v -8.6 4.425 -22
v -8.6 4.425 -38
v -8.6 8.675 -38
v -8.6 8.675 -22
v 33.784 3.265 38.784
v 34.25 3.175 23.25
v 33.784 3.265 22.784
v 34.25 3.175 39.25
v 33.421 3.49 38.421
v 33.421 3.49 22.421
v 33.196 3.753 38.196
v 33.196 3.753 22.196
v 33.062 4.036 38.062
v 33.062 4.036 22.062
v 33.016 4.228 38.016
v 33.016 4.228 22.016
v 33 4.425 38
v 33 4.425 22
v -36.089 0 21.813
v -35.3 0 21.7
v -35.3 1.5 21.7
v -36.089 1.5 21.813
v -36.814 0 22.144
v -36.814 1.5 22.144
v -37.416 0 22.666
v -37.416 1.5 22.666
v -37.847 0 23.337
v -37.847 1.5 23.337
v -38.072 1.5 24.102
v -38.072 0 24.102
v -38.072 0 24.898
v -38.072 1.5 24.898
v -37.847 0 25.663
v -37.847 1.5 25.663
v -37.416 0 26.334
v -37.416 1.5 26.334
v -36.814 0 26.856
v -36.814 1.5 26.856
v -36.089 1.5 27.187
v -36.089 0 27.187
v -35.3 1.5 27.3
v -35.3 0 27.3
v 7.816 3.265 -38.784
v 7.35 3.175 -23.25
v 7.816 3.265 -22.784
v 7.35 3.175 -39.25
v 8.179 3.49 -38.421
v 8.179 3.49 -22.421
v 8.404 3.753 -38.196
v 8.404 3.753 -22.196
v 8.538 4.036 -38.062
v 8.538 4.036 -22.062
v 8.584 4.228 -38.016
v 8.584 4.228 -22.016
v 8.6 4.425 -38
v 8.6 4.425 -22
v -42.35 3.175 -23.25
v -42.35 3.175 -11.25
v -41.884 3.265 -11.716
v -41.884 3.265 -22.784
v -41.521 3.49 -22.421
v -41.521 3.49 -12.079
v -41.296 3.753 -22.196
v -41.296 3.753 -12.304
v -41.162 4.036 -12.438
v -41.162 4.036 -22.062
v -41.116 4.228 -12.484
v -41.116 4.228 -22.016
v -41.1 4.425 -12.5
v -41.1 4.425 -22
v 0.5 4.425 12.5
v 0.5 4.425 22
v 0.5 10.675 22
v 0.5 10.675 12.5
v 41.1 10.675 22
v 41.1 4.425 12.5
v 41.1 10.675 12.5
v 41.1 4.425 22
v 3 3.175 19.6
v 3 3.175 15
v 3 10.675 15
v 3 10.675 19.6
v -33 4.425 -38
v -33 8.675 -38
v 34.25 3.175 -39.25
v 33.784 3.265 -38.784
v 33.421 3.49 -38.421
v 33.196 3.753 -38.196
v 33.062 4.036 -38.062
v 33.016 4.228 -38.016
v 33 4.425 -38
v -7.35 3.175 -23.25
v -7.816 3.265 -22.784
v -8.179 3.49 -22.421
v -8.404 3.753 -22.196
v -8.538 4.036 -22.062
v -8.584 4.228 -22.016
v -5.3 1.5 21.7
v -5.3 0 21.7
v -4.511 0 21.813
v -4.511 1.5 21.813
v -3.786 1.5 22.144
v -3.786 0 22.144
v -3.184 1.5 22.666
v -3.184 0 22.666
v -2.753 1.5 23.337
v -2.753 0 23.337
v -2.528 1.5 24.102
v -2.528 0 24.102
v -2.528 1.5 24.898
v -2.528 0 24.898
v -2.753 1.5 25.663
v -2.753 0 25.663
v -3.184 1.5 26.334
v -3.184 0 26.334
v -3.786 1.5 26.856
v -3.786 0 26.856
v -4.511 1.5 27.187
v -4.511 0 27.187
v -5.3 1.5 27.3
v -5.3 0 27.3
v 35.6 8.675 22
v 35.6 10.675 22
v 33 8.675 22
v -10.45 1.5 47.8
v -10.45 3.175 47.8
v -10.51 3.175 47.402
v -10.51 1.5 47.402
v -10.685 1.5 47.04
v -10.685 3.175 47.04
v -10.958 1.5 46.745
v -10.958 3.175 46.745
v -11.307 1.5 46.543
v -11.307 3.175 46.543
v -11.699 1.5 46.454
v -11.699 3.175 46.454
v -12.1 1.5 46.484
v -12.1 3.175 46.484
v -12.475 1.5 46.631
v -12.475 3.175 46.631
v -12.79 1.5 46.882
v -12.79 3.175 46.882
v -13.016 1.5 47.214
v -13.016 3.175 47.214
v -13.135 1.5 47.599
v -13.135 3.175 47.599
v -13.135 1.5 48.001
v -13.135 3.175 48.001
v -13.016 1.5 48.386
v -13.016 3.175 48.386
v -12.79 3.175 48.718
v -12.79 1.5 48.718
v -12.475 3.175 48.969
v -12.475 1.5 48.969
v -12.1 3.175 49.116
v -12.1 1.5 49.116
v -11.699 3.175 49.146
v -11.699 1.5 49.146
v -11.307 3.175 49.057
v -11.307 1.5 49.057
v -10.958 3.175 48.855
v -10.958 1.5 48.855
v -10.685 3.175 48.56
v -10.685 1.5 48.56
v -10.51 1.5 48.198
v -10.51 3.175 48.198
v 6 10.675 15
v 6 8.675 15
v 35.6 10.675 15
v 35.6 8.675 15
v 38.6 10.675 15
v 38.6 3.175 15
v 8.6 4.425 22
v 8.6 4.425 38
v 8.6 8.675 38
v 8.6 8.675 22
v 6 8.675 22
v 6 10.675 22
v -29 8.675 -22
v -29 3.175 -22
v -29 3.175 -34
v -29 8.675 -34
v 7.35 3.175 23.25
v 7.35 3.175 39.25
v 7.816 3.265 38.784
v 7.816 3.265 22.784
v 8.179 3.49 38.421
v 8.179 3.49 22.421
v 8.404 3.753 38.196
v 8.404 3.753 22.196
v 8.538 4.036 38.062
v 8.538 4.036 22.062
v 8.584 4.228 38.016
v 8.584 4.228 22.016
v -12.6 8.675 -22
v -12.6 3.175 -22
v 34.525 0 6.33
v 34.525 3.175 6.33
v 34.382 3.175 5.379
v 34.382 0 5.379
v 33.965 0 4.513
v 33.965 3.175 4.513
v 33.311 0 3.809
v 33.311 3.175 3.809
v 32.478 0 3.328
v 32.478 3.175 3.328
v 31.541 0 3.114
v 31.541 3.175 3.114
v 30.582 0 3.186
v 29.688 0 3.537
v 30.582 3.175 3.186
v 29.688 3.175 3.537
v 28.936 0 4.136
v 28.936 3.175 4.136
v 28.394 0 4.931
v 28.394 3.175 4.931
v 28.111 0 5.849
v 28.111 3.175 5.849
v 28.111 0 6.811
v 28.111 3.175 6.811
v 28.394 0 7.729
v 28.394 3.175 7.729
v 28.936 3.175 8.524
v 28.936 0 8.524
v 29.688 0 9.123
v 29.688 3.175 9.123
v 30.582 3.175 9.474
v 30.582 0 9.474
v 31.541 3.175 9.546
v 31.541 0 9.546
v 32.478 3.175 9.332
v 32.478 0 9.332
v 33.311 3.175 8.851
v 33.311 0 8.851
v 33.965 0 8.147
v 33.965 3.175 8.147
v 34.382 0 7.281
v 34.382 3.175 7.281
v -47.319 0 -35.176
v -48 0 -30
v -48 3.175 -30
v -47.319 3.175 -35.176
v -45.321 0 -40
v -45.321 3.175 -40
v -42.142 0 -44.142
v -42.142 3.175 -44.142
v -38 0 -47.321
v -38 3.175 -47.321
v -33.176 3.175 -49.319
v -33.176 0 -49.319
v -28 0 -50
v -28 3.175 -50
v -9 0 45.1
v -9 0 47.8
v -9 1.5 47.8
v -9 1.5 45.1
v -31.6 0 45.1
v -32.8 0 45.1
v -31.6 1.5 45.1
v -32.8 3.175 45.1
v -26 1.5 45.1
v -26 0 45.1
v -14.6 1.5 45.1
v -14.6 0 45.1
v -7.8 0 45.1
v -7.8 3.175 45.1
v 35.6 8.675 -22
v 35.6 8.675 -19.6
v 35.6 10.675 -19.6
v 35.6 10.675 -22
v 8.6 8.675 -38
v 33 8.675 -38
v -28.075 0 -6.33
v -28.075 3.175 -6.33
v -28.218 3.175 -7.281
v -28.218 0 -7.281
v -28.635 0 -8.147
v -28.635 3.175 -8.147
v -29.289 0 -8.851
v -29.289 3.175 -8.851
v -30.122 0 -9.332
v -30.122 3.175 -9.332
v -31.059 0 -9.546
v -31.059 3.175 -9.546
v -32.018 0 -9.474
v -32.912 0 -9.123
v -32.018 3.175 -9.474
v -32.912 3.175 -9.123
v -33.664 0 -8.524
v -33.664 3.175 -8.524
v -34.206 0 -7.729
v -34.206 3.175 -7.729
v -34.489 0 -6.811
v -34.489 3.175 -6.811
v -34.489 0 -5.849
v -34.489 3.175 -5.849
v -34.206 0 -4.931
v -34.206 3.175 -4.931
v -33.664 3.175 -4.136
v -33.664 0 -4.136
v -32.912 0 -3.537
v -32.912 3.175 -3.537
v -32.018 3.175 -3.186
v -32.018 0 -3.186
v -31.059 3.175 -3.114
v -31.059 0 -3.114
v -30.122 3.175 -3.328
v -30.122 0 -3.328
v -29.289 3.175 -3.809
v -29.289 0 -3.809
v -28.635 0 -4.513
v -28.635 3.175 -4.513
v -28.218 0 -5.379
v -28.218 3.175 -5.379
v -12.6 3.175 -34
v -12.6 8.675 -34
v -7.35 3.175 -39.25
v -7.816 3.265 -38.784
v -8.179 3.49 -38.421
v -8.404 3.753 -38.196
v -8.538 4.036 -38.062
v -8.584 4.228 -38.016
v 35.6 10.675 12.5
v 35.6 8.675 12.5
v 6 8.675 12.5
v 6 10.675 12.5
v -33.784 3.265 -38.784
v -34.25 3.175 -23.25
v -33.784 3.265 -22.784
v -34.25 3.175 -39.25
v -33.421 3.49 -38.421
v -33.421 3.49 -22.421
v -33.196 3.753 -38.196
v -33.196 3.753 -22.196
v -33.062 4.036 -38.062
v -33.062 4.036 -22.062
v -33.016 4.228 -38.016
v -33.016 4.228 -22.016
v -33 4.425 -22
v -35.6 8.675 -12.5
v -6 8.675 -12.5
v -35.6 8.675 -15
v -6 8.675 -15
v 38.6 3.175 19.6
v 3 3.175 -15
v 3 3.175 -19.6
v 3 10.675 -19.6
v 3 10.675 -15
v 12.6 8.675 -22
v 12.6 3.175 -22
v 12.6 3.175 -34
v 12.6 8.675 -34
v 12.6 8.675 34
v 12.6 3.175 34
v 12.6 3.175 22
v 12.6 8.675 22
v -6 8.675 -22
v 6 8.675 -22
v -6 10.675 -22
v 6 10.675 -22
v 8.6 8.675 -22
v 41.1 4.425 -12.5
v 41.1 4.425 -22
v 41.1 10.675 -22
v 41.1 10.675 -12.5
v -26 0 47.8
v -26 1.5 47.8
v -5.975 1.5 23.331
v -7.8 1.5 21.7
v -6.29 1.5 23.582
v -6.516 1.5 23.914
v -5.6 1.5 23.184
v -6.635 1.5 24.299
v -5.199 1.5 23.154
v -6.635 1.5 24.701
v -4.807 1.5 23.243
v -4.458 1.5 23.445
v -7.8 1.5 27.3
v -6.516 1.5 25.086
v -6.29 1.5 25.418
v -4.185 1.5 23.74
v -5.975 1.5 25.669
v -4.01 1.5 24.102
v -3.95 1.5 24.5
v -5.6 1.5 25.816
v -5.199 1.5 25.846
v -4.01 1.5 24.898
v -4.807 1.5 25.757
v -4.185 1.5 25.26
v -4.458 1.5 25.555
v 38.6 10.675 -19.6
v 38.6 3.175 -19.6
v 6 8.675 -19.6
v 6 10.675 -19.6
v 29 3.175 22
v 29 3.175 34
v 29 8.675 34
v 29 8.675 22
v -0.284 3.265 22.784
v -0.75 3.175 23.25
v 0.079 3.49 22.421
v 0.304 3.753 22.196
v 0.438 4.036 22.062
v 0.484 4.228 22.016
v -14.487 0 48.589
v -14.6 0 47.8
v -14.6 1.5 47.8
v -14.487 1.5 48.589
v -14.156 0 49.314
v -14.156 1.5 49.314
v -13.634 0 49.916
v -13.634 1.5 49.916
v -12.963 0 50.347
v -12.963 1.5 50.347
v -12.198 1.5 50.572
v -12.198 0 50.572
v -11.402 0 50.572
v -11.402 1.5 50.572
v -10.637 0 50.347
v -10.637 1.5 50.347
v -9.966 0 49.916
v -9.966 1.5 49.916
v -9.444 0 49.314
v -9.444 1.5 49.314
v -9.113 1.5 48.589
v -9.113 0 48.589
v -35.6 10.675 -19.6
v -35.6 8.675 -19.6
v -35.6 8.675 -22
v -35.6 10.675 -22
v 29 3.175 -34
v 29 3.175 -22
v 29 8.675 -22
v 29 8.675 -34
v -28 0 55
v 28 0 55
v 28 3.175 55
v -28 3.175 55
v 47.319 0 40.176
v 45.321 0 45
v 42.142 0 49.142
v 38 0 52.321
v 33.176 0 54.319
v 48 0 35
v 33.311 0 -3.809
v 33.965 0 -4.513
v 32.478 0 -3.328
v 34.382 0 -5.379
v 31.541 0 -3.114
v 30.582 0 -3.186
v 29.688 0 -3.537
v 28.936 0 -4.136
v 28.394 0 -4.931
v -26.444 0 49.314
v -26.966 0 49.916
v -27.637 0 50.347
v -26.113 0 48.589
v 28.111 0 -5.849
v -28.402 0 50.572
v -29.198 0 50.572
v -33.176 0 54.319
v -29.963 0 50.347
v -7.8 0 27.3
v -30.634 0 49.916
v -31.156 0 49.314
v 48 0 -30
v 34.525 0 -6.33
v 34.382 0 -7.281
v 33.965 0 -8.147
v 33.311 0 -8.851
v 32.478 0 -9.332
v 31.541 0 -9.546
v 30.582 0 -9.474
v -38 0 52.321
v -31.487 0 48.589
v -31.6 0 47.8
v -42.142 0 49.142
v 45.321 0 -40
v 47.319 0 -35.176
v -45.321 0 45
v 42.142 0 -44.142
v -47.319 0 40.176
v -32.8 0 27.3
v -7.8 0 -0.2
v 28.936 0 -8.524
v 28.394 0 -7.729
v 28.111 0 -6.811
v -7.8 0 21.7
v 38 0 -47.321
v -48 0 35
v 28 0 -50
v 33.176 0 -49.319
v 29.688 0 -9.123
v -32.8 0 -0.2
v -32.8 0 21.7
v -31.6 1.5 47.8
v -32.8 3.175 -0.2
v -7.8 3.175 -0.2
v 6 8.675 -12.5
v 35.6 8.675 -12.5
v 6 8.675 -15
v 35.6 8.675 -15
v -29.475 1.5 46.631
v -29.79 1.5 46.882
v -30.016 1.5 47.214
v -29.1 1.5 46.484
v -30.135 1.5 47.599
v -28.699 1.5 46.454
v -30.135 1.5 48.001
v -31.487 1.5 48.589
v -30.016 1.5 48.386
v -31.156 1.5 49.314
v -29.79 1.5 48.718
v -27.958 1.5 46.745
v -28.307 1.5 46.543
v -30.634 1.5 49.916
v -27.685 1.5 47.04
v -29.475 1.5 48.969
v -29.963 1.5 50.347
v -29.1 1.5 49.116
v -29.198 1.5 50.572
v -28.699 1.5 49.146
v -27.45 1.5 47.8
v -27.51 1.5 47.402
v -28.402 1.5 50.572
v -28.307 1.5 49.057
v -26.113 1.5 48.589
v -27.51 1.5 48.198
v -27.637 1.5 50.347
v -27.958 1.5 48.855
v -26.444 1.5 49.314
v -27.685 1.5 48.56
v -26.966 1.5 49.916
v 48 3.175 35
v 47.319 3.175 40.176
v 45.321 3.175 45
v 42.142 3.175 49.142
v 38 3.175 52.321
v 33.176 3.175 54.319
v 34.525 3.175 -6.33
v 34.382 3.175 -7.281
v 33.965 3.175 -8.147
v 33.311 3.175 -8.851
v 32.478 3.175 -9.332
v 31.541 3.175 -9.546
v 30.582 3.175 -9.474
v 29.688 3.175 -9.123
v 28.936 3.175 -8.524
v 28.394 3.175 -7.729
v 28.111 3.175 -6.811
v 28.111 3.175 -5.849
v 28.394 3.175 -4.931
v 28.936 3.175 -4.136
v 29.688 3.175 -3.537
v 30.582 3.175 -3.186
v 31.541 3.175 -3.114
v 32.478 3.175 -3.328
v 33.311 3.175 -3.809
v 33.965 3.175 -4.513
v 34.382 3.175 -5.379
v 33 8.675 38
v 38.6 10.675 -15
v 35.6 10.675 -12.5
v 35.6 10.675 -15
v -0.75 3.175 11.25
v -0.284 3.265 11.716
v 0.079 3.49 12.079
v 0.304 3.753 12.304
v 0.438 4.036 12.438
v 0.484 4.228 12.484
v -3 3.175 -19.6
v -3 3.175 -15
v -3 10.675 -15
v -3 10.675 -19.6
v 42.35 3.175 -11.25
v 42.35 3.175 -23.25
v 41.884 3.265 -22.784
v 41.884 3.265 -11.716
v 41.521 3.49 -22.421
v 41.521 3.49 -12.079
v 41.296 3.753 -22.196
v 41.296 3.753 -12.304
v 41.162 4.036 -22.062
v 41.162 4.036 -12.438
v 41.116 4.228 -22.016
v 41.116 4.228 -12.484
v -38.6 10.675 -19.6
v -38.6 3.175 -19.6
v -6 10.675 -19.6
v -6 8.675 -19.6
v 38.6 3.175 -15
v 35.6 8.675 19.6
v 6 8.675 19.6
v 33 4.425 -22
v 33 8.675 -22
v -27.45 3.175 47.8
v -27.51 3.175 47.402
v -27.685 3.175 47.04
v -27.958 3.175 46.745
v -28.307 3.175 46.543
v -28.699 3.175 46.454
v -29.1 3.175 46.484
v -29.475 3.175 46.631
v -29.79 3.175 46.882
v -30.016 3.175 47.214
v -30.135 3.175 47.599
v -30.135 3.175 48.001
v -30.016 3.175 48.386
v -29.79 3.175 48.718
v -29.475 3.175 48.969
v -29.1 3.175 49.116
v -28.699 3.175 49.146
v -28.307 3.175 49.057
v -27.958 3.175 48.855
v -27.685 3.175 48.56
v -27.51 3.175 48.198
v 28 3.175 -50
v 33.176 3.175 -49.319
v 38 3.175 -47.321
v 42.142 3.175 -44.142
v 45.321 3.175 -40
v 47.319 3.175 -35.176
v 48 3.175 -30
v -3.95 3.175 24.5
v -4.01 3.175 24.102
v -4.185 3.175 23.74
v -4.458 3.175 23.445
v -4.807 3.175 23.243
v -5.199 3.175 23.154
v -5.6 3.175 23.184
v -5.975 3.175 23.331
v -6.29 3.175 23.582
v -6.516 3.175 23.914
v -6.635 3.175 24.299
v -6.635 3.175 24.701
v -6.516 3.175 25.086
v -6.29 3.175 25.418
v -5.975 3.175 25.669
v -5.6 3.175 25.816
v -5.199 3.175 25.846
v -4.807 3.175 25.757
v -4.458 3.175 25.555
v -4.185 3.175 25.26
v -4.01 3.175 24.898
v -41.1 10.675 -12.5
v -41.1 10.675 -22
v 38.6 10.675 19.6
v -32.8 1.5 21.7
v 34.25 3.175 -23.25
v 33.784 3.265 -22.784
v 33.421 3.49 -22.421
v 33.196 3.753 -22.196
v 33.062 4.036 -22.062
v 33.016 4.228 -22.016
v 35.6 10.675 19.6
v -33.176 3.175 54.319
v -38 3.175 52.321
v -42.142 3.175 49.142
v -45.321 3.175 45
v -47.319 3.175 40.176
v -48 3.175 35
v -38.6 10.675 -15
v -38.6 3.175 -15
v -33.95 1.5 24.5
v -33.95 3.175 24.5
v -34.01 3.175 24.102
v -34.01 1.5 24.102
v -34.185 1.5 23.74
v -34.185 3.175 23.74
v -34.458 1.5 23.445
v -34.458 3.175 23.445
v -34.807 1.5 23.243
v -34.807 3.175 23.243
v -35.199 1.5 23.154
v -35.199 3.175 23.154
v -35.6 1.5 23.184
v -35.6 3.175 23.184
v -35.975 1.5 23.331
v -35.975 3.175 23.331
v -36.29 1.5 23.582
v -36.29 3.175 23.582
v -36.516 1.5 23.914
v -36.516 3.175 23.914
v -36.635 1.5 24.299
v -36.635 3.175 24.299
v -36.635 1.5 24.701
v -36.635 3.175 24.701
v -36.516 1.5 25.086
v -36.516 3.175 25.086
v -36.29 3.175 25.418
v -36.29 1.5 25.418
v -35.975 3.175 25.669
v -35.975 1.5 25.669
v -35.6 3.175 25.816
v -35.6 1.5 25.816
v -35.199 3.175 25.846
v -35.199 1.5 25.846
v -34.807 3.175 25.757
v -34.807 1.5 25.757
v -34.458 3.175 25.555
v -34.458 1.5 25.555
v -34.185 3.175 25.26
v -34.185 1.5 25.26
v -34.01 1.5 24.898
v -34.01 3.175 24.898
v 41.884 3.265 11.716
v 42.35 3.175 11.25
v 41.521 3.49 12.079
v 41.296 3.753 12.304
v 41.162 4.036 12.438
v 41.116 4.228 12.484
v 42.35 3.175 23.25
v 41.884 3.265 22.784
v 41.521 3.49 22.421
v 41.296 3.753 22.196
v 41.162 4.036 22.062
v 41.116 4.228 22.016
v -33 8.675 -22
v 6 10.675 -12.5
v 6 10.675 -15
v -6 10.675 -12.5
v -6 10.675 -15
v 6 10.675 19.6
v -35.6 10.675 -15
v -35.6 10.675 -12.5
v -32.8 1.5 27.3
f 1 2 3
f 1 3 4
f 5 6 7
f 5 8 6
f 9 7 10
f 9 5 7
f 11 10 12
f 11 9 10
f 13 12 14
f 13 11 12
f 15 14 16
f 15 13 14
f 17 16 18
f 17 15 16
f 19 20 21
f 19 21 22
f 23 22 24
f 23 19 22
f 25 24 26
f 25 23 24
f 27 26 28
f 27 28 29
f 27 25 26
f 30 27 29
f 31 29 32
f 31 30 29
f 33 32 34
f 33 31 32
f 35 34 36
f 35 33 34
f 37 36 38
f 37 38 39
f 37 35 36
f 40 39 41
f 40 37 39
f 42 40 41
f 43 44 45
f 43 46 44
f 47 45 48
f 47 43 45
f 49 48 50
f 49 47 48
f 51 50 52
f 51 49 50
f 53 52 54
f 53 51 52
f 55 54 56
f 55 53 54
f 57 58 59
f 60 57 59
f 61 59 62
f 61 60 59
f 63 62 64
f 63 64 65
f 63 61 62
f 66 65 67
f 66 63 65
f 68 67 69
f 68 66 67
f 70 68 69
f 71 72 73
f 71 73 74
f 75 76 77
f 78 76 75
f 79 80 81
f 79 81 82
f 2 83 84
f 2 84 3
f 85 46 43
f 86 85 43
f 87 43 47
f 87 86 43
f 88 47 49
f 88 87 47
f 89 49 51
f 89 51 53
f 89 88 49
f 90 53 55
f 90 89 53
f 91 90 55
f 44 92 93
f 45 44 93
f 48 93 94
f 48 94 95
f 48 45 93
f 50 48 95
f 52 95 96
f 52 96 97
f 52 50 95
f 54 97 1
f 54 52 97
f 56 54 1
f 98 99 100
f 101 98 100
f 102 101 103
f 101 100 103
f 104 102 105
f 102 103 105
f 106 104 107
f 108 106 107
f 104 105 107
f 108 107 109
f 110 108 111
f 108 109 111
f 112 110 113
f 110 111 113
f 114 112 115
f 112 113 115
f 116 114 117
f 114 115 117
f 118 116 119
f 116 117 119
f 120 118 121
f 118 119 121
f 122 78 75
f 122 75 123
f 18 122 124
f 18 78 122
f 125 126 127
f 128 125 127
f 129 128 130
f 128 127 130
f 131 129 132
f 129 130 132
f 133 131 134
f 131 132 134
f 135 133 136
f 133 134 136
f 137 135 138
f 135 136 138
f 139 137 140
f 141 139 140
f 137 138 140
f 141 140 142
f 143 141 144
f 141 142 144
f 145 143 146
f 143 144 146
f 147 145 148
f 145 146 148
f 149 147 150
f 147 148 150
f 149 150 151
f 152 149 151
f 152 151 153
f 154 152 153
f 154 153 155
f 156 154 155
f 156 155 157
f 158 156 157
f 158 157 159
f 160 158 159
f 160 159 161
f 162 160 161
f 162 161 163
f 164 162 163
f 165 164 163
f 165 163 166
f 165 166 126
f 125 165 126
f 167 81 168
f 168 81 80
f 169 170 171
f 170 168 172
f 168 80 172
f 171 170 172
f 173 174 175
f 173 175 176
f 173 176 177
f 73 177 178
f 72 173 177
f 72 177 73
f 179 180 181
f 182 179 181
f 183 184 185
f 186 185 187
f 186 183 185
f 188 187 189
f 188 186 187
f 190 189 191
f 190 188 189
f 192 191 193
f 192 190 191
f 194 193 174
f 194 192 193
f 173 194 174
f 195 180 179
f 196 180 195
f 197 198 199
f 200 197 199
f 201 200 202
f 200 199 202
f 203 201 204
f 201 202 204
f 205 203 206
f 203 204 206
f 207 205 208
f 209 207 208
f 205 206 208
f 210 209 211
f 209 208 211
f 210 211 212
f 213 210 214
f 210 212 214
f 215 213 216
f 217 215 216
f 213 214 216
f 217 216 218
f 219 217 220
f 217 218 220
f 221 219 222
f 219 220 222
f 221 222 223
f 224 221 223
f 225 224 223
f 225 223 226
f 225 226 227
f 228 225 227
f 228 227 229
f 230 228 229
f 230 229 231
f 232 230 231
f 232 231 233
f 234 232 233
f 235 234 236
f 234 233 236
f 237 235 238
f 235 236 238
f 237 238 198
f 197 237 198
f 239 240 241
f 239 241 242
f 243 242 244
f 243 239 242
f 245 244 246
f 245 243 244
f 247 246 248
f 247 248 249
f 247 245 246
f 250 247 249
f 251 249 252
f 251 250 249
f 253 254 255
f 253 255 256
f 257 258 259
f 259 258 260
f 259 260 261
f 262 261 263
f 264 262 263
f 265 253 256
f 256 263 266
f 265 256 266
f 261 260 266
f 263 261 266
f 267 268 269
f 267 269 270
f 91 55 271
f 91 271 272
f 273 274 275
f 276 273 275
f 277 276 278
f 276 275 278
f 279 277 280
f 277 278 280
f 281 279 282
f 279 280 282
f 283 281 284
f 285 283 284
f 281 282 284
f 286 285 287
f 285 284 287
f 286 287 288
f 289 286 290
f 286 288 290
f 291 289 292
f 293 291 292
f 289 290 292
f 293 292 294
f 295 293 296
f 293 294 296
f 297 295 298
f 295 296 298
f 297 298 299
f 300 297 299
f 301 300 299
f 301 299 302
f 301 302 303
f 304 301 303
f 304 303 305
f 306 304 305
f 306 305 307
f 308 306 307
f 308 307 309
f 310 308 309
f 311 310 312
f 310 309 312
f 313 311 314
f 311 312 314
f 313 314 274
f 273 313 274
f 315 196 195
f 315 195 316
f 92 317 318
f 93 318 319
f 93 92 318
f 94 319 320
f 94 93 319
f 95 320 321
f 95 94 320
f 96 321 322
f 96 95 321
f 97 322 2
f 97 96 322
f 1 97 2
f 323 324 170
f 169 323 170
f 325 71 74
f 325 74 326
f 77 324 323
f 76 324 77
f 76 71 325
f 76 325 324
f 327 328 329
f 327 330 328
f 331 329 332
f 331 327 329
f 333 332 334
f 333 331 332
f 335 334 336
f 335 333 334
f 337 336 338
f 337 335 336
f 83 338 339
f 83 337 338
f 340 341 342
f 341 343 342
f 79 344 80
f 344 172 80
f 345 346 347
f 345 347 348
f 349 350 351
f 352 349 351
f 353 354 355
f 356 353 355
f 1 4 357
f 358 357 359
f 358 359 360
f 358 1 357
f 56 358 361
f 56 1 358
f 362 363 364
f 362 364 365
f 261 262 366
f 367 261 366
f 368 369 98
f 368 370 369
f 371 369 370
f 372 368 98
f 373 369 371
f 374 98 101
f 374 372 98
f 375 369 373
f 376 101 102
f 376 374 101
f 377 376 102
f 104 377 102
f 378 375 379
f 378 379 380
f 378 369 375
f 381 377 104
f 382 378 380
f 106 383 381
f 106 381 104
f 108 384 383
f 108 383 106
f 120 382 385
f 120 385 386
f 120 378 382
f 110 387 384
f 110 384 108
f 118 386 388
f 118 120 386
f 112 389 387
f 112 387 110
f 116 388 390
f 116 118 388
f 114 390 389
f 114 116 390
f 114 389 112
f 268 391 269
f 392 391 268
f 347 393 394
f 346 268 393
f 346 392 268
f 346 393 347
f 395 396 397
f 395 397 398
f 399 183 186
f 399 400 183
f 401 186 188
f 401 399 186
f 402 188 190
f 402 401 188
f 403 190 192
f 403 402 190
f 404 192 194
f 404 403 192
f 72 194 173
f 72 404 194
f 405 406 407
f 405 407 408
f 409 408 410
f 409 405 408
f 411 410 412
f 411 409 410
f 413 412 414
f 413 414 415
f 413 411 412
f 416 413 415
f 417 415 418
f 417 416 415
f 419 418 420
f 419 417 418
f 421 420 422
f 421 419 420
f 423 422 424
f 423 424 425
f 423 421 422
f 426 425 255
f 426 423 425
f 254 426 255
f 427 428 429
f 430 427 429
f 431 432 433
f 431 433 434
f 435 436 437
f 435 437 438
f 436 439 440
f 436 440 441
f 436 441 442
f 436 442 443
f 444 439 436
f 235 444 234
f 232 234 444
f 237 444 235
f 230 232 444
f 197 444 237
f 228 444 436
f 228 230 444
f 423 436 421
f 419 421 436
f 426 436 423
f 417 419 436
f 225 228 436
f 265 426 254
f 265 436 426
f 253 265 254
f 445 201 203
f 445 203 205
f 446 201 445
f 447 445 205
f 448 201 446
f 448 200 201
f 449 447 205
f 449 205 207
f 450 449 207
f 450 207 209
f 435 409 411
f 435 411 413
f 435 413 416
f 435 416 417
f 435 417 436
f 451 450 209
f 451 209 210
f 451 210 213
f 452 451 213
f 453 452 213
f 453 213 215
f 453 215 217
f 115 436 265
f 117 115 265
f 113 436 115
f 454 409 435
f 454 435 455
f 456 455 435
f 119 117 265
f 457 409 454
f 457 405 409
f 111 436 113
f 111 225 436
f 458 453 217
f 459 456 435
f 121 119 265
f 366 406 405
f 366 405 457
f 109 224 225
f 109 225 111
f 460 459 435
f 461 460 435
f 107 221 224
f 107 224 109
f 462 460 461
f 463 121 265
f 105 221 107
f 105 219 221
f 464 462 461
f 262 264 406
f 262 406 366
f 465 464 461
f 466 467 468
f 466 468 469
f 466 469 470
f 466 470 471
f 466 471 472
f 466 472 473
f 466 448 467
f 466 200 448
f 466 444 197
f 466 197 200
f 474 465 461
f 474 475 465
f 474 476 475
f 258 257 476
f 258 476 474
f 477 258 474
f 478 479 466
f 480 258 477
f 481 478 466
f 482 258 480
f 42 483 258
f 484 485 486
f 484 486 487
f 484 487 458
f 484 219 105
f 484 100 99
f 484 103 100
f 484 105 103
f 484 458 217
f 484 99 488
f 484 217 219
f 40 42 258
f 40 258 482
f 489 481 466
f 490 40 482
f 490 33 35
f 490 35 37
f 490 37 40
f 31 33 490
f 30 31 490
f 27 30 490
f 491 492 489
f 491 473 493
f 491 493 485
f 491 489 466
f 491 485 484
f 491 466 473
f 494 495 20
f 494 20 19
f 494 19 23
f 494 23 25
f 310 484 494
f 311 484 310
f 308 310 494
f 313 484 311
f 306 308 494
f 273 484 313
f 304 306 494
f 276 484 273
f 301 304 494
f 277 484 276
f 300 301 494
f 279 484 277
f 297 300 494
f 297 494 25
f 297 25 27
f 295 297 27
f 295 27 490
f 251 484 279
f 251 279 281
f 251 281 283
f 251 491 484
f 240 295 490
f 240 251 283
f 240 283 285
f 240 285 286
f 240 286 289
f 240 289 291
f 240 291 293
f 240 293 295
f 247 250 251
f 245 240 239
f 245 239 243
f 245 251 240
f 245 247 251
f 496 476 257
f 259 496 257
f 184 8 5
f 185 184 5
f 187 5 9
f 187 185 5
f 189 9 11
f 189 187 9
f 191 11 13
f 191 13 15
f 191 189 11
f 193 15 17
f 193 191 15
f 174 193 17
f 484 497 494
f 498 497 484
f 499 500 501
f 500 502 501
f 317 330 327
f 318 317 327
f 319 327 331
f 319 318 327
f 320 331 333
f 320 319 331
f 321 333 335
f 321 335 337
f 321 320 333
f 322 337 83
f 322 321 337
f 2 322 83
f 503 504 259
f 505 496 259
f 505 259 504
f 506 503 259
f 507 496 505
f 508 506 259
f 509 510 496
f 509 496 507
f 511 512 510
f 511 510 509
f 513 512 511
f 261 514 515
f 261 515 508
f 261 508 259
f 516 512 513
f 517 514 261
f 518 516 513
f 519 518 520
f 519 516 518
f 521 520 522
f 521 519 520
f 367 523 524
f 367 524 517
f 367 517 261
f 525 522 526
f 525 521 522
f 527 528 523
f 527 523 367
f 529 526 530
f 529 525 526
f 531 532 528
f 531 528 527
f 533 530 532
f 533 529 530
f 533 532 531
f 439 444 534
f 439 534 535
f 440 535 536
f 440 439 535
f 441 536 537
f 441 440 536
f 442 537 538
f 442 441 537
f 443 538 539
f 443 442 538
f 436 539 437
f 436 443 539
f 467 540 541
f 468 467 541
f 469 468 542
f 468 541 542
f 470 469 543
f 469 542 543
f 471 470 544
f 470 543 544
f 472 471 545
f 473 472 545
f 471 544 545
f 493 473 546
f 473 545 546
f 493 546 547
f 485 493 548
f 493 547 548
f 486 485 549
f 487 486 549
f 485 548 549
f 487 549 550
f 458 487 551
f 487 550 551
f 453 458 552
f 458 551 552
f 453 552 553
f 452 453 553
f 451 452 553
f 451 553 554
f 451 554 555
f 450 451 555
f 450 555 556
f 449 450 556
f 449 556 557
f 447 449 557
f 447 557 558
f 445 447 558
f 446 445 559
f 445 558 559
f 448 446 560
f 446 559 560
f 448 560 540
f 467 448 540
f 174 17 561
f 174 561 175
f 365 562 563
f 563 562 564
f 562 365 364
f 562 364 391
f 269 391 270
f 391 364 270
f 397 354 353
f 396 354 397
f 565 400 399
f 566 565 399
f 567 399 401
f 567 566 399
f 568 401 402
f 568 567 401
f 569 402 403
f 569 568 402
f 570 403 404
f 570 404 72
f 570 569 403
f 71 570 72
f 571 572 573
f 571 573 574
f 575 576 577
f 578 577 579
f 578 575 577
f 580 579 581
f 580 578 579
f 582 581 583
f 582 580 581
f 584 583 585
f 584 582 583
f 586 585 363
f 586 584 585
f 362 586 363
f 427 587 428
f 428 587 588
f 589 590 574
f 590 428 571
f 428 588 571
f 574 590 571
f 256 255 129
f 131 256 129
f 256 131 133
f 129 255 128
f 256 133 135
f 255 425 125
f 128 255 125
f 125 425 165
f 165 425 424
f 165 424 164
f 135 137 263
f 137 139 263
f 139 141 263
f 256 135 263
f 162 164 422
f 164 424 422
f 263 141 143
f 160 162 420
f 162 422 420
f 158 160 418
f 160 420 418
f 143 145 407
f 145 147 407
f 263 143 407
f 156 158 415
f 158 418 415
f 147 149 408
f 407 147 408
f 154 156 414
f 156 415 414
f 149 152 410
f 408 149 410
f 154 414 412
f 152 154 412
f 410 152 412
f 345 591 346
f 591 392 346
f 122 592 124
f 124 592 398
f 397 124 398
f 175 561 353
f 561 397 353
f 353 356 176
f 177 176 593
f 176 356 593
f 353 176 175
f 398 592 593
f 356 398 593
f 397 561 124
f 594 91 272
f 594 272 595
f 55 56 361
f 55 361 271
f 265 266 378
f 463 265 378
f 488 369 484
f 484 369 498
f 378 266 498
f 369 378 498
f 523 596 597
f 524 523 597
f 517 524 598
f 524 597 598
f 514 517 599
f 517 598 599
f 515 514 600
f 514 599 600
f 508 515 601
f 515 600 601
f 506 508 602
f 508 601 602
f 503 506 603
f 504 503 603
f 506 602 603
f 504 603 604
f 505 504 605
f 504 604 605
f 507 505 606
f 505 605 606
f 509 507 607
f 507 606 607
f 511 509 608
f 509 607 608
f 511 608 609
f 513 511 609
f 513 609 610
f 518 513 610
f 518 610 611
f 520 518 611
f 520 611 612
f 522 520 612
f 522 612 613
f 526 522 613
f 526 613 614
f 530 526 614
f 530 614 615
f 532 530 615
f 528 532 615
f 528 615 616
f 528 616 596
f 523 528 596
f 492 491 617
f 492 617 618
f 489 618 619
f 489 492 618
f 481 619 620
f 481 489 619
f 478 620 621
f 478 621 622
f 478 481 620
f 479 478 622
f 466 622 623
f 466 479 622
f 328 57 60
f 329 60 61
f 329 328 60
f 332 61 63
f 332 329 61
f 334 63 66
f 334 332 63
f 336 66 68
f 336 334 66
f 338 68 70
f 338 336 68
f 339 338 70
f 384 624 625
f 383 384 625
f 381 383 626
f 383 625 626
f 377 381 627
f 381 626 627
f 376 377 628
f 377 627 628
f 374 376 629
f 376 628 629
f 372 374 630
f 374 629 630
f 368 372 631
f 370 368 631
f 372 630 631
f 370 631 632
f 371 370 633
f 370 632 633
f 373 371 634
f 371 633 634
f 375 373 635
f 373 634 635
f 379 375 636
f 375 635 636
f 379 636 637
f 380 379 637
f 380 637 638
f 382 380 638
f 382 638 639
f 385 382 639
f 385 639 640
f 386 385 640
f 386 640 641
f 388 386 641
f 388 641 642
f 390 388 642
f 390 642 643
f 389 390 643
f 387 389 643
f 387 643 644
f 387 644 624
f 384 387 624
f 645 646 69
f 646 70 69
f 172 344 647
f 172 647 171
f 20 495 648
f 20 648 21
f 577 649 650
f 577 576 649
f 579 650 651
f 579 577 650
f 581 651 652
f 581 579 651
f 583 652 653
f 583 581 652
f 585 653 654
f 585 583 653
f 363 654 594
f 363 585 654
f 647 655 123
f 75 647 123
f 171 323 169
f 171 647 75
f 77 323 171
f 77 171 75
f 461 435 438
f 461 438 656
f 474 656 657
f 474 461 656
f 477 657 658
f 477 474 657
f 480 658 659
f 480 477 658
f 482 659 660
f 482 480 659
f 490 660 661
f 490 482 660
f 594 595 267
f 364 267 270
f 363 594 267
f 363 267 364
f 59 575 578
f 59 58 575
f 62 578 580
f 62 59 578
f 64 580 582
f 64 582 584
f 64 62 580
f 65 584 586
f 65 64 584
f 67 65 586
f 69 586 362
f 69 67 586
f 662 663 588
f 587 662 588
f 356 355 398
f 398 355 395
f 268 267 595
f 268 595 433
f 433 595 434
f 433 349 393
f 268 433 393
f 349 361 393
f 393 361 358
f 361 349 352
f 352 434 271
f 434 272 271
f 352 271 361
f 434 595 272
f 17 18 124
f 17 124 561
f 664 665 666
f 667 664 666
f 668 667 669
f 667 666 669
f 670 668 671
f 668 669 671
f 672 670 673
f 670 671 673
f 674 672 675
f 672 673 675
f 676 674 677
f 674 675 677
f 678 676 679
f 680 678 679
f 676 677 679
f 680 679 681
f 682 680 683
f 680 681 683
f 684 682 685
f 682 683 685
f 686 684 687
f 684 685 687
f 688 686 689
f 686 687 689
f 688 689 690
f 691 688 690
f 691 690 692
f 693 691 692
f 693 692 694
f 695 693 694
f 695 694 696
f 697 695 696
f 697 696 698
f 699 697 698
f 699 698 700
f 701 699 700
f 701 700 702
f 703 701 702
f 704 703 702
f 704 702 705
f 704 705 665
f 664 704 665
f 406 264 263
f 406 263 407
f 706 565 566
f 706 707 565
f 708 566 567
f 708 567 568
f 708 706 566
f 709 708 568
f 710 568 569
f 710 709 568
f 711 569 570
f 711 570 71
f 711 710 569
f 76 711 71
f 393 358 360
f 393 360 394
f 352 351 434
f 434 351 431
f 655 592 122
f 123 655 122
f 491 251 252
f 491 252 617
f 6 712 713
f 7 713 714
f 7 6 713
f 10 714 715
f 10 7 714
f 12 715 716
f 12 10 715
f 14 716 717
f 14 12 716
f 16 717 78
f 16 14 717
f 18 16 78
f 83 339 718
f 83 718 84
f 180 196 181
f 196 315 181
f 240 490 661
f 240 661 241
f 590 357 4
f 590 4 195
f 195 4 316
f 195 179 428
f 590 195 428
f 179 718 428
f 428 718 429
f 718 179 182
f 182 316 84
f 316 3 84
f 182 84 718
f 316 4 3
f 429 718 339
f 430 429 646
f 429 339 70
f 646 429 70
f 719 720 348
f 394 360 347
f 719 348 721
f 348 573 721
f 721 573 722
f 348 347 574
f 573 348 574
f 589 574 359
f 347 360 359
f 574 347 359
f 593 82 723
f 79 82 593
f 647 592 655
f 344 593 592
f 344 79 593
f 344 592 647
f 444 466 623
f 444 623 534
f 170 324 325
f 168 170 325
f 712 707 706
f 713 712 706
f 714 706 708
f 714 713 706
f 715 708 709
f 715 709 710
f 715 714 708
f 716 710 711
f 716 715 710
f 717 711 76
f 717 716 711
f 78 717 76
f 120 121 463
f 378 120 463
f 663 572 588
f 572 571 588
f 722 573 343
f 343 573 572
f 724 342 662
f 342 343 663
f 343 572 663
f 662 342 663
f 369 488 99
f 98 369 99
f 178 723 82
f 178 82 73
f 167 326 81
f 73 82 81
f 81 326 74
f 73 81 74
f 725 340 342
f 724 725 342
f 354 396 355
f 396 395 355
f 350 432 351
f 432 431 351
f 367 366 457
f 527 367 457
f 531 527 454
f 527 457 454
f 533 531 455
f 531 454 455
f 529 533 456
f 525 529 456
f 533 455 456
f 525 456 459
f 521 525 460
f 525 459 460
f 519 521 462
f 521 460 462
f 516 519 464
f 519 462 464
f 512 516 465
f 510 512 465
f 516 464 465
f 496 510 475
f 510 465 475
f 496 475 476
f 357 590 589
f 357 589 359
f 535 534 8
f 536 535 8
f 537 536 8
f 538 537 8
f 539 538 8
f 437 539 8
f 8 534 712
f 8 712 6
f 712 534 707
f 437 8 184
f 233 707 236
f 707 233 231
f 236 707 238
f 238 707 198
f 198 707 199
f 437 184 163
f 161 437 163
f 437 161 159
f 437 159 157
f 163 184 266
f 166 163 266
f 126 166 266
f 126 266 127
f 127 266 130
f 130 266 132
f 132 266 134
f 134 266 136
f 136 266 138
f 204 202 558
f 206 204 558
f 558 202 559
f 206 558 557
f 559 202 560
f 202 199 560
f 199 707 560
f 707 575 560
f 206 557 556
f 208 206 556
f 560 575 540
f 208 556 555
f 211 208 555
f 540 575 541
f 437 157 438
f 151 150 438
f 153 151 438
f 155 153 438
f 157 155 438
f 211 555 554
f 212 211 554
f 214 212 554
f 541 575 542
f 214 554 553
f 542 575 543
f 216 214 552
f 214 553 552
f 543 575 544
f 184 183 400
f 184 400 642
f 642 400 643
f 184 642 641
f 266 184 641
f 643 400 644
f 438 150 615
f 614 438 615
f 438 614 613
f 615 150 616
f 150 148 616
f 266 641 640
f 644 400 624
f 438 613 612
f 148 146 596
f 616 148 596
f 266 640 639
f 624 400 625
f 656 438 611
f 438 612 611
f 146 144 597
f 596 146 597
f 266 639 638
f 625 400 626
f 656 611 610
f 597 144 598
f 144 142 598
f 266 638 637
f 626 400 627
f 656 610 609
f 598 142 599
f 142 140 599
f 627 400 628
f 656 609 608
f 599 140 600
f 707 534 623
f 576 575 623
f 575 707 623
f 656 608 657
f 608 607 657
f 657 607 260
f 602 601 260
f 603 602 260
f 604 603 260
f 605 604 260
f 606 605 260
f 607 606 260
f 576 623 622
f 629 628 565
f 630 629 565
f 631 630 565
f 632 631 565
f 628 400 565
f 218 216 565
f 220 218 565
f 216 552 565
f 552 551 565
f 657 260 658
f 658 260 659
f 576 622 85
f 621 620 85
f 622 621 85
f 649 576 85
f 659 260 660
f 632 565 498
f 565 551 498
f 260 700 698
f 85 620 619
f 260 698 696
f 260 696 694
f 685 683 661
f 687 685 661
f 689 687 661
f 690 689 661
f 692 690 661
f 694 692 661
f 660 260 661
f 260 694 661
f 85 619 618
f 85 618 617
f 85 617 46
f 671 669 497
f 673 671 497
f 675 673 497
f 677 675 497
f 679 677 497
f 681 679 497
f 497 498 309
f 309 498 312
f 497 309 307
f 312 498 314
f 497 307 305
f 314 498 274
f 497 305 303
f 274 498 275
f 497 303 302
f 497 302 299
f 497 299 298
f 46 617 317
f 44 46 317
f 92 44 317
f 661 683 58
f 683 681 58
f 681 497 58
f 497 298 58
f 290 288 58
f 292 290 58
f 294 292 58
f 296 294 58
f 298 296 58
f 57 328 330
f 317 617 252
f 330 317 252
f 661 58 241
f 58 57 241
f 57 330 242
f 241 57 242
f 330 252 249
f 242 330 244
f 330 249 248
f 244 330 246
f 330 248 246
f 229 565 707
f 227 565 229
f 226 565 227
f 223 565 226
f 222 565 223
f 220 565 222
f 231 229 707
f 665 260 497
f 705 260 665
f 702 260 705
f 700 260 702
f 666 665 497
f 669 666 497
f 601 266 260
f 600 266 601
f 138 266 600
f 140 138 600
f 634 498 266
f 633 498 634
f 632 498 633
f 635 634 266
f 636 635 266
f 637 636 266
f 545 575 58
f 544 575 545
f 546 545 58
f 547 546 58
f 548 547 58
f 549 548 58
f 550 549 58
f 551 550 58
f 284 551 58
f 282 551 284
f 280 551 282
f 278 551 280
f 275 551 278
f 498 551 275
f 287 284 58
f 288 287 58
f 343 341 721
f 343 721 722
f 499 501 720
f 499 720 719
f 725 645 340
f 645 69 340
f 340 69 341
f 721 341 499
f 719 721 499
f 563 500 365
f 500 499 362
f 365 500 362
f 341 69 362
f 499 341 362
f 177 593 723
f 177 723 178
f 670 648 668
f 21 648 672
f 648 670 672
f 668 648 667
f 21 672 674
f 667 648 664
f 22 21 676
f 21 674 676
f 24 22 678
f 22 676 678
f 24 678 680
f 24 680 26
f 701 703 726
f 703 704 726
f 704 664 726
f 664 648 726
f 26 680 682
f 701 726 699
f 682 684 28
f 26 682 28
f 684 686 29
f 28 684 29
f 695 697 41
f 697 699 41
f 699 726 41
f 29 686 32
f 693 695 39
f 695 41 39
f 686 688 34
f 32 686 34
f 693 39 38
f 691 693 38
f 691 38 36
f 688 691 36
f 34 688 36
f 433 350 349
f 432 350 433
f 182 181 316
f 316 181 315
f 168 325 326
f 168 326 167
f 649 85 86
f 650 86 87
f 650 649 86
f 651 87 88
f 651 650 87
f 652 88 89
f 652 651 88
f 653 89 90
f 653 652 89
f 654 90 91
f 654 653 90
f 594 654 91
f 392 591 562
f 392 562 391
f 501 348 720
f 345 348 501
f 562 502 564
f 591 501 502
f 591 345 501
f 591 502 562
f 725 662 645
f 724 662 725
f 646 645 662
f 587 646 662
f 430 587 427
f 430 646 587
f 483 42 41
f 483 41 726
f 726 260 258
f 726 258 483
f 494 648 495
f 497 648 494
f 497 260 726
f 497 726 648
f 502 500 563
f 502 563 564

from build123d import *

# Parameters (mm, degrees)
W_TOP_DEPTH         = 3.175
SKETCH3_W           = 35.6
SKETCH3_H           = 4.6
SKETCH3_W_2         = 16.4
SKETCH3_H_2         = 12
A_HOLDERS_DEPTH     = 5.5
HOLDER_CHAMFER_R    = 1.25
A_CLAMP_DEPTH       = 2
SKETCH12_R          = 1.35
SKETCH12_W          = 25
SKETCH12_H          = 45.3
A_HOLES_DEPTH       = 3.175
A_HOLES_GUIDE_DEPTH = 1.5
SKETCH15_R          = 3.225
TENDON_HOLES_DEPTH  = 3.175


with BuildPart() as part:
    # Sketch1 → w_top (new body)
    with BuildSketch(Plane(origin=(0, 0, 0), x_dir=(1, 0, 0), z_dir=(0, 1, 0))):
        with BuildLine():
            Line((-48, -35), (-48, 30))
            ThreePointArc((-48, 30), (-42.142135624, 44.142135624), (-28, 50))
            Line((-28, 50), (28, 50))
            ThreePointArc((28, 50), (42.142135624, 44.142135624), (48, 30))
            Line((48, 30), (48, -35))
            ThreePointArc((48, -35), (42.142135624, -49.142135624), (28, -55))
            Line((28, -55), (-28, -55))
            ThreePointArc((-28, -55), (-42.142135624, -49.142135624), (-48, -35))
        make_face()
    extrude(amount=W_TOP_DEPTH)

    # Sketch3 → a_holders (add)
    with BuildSketch(Plane(origin=(0, 3.175, 0), x_dir=(1, 0, 0), z_dir=(0, 1, 0))):
        Polygon((-33, 22), (-33, 38), (-8.6, 38), (-8.6, 22), (8.6, 22), (8.6, 38), (33, 38), (33, 22), (41.1, 22), (41.1, 12.5), (-41.1, 12.5), (-41.1, 22), align=None)
        with Locations((20.8, 17.3)):
            Rectangle(SKETCH3_W, SKETCH3_H, mode=Mode.SUBTRACT)
        with Locations((-20.8, 17.3)):
            Rectangle(SKETCH3_W, SKETCH3_H, mode=Mode.SUBTRACT)
        with Locations((-20.8, 28)):
            Rectangle(SKETCH3_W_2, SKETCH3_H_2, mode=Mode.SUBTRACT)
        with Locations((20.8, 28)):
            Rectangle(SKETCH3_W_2, SKETCH3_H_2, mode=Mode.SUBTRACT)
        Polygon((8.6, -22), (0.5, -22), (0.5, -12.5), (41.1, -12.5), (41.1, -22), (33, -22), (33, -38), (8.6, -38), align=None)
        with Locations((20.8, -17.3)):
            Rectangle(SKETCH3_W, SKETCH3_H, mode=Mode.SUBTRACT)
        with Locations((20.8, -28)):
            Rectangle(SKETCH3_W_2, SKETCH3_H_2, mode=Mode.SUBTRACT)
    extrude(amount=A_HOLDERS_DEPTH)

    # holder_chamfer
    holder_chamfer_edges = [part.edges().sort_by_distance(p)[0] for p in [
        (0.5, 3.175, 17.25),
        (20.8, 3.175, 12.5),
        (41.1, 3.175, 17.25),
        (37.05, 3.175, 22),
        (33, 3.175, 30),
        (20.8, 3.175, 38),
        (8.6, 3.175, 30),
        (4.55, 3.175, 22),
        (41.1, 3.175, -17.25),
        (0, 3.175, -12.5),
        (-41.1, 3.175, -17.25),
        (-37.05, 3.175, -22),
        (-33, 3.175, -30),
        (-20.8, 3.175, -38),
        (-8.6, 3.175, -30),
        (0, 3.175, -22),
        (8.6, 3.175, -30),
        (20.8, 3.175, -38),
        (33, 3.175, -30),
        (37.05, 3.175, -22),
    ]]
    fillet(holder_chamfer_edges, radius=HOLDER_CHAMFER_R)

    # Sketch14 → a_clamp (add)
    with BuildSketch(Plane(origin=(0, 8.675, 0), x_dir=(1, 0, 0), z_dir=(0, 1, 0))):
        Polygon((-35.6, 19.6), (-35.6, 22), (-41.1, 22), (-41.1, 12.5), (-35.6, 12.5), (-35.6, 15), (-38.6, 15), (-38.6, 19.6), align=None)
        Polygon((-3, 19.6), (-6, 19.6), (-6, 22), (6, 22), (6, 19.6), (3, 19.6), (3, 15), (6, 15), (6, 12.5), (-6, 12.5), (-6, 15), (-3, 15), align=None)
        Polygon((38.6, 19.6), (35.6, 19.6), (35.6, 22), (41.1, 22), (41.1, 12.5), (35.6, 12.5), (35.6, 15), (38.6, 15), align=None)
        Polygon((0.5, -12.5), (6, -12.5), (6, -15), (3, -15), (3, -19.6), (6, -19.6), (6, -22), (0.5, -22), align=None)
        Polygon((35.6, -19.6), (35.6, -22), (41.1, -22), (41.1, -12.5), (35.6, -12.5), (35.6, -15), (38.6, -15), (38.6, -19.6), align=None)
    extrude(amount=A_CLAMP_DEPTH)

    # Sketch12 → a_holes (cut)
    with BuildSketch(Plane(origin=(0, 3.175, 0), x_dir=(1, 0, 0), z_dir=(0, 1, 0))):
        with Locations((-28.8, -47.8)):
            Circle(SKETCH12_R)
        with Locations((-11.8, -47.8)):
            Circle(SKETCH12_R)
        with Locations((-35.3, -24.5)):
            Circle(SKETCH12_R)
        with Locations((-5.3, -24.5)):
            Circle(SKETCH12_R)
        with Locations((-20.3, -22.45)):
            Rectangle(SKETCH12_W, SKETCH12_H)
    extrude(amount=-A_HOLES_DEPTH, mode=Mode.SUBTRACT)

    # Sketch13 → a_holes guide (cut)
    with BuildSketch(Plane.XZ):
        with BuildLine():
            Line((-31.6, 47.8), (-31.6, 45.1))
            Line((-31.6, 45.1), (-26, 45.1))
            Line((-26, 45.1), (-26, 47.8))
            ThreePointArc((-26, 47.8), (-28.8, 50.6), (-31.6, 47.8))
        make_face()
        with BuildLine():
            Line((-35.3, 27.3), (-32.8, 27.3))
            Line((-32.8, 27.3), (-32.8, 21.7))
            Line((-32.8, 21.7), (-35.3, 21.7))
            ThreePointArc((-35.3, 21.7), (-38.1, 24.5), (-35.3, 27.3))
        make_face()
        with BuildLine():
            Line((-7.8, 21.7), (-5.3, 21.7))
            ThreePointArc((-5.3, 21.7), (-2.5, 24.5), (-5.3, 27.3))
            Line((-5.3, 27.3), (-7.8, 27.3))
            Line((-7.8, 27.3), (-7.8, 21.7))
        make_face()
        with BuildLine():
            Line((-14.6, 45.1), (-14.6, 47.8))
            ThreePointArc((-14.6, 47.8), (-11.8, 50.6), (-9, 47.8))
            Line((-9, 47.8), (-9, 45.1))
            Line((-9, 45.1), (-14.6, 45.1))
        make_face()
    extrude(amount=-A_HOLES_GUIDE_DEPTH, mode=Mode.SUBTRACT)

    # Sketch15 → tendon holes (cut)
    with BuildSketch(Plane(origin=(0, 3.175, 0), x_dir=(1, 0, 0), z_dir=(0, 1, 0))):
        with Locations((-31.3, 6.33)):
            Circle(SKETCH15_R)
        with Locations((31.3, 6.33)):
            Circle(SKETCH15_R)
        with Locations((31.3, -6.33)):
            Circle(SKETCH15_R)
    extrude(amount=-TENDON_HOLES_DEPTH, mode=Mode.SUBTRACT)


solid = part.part
